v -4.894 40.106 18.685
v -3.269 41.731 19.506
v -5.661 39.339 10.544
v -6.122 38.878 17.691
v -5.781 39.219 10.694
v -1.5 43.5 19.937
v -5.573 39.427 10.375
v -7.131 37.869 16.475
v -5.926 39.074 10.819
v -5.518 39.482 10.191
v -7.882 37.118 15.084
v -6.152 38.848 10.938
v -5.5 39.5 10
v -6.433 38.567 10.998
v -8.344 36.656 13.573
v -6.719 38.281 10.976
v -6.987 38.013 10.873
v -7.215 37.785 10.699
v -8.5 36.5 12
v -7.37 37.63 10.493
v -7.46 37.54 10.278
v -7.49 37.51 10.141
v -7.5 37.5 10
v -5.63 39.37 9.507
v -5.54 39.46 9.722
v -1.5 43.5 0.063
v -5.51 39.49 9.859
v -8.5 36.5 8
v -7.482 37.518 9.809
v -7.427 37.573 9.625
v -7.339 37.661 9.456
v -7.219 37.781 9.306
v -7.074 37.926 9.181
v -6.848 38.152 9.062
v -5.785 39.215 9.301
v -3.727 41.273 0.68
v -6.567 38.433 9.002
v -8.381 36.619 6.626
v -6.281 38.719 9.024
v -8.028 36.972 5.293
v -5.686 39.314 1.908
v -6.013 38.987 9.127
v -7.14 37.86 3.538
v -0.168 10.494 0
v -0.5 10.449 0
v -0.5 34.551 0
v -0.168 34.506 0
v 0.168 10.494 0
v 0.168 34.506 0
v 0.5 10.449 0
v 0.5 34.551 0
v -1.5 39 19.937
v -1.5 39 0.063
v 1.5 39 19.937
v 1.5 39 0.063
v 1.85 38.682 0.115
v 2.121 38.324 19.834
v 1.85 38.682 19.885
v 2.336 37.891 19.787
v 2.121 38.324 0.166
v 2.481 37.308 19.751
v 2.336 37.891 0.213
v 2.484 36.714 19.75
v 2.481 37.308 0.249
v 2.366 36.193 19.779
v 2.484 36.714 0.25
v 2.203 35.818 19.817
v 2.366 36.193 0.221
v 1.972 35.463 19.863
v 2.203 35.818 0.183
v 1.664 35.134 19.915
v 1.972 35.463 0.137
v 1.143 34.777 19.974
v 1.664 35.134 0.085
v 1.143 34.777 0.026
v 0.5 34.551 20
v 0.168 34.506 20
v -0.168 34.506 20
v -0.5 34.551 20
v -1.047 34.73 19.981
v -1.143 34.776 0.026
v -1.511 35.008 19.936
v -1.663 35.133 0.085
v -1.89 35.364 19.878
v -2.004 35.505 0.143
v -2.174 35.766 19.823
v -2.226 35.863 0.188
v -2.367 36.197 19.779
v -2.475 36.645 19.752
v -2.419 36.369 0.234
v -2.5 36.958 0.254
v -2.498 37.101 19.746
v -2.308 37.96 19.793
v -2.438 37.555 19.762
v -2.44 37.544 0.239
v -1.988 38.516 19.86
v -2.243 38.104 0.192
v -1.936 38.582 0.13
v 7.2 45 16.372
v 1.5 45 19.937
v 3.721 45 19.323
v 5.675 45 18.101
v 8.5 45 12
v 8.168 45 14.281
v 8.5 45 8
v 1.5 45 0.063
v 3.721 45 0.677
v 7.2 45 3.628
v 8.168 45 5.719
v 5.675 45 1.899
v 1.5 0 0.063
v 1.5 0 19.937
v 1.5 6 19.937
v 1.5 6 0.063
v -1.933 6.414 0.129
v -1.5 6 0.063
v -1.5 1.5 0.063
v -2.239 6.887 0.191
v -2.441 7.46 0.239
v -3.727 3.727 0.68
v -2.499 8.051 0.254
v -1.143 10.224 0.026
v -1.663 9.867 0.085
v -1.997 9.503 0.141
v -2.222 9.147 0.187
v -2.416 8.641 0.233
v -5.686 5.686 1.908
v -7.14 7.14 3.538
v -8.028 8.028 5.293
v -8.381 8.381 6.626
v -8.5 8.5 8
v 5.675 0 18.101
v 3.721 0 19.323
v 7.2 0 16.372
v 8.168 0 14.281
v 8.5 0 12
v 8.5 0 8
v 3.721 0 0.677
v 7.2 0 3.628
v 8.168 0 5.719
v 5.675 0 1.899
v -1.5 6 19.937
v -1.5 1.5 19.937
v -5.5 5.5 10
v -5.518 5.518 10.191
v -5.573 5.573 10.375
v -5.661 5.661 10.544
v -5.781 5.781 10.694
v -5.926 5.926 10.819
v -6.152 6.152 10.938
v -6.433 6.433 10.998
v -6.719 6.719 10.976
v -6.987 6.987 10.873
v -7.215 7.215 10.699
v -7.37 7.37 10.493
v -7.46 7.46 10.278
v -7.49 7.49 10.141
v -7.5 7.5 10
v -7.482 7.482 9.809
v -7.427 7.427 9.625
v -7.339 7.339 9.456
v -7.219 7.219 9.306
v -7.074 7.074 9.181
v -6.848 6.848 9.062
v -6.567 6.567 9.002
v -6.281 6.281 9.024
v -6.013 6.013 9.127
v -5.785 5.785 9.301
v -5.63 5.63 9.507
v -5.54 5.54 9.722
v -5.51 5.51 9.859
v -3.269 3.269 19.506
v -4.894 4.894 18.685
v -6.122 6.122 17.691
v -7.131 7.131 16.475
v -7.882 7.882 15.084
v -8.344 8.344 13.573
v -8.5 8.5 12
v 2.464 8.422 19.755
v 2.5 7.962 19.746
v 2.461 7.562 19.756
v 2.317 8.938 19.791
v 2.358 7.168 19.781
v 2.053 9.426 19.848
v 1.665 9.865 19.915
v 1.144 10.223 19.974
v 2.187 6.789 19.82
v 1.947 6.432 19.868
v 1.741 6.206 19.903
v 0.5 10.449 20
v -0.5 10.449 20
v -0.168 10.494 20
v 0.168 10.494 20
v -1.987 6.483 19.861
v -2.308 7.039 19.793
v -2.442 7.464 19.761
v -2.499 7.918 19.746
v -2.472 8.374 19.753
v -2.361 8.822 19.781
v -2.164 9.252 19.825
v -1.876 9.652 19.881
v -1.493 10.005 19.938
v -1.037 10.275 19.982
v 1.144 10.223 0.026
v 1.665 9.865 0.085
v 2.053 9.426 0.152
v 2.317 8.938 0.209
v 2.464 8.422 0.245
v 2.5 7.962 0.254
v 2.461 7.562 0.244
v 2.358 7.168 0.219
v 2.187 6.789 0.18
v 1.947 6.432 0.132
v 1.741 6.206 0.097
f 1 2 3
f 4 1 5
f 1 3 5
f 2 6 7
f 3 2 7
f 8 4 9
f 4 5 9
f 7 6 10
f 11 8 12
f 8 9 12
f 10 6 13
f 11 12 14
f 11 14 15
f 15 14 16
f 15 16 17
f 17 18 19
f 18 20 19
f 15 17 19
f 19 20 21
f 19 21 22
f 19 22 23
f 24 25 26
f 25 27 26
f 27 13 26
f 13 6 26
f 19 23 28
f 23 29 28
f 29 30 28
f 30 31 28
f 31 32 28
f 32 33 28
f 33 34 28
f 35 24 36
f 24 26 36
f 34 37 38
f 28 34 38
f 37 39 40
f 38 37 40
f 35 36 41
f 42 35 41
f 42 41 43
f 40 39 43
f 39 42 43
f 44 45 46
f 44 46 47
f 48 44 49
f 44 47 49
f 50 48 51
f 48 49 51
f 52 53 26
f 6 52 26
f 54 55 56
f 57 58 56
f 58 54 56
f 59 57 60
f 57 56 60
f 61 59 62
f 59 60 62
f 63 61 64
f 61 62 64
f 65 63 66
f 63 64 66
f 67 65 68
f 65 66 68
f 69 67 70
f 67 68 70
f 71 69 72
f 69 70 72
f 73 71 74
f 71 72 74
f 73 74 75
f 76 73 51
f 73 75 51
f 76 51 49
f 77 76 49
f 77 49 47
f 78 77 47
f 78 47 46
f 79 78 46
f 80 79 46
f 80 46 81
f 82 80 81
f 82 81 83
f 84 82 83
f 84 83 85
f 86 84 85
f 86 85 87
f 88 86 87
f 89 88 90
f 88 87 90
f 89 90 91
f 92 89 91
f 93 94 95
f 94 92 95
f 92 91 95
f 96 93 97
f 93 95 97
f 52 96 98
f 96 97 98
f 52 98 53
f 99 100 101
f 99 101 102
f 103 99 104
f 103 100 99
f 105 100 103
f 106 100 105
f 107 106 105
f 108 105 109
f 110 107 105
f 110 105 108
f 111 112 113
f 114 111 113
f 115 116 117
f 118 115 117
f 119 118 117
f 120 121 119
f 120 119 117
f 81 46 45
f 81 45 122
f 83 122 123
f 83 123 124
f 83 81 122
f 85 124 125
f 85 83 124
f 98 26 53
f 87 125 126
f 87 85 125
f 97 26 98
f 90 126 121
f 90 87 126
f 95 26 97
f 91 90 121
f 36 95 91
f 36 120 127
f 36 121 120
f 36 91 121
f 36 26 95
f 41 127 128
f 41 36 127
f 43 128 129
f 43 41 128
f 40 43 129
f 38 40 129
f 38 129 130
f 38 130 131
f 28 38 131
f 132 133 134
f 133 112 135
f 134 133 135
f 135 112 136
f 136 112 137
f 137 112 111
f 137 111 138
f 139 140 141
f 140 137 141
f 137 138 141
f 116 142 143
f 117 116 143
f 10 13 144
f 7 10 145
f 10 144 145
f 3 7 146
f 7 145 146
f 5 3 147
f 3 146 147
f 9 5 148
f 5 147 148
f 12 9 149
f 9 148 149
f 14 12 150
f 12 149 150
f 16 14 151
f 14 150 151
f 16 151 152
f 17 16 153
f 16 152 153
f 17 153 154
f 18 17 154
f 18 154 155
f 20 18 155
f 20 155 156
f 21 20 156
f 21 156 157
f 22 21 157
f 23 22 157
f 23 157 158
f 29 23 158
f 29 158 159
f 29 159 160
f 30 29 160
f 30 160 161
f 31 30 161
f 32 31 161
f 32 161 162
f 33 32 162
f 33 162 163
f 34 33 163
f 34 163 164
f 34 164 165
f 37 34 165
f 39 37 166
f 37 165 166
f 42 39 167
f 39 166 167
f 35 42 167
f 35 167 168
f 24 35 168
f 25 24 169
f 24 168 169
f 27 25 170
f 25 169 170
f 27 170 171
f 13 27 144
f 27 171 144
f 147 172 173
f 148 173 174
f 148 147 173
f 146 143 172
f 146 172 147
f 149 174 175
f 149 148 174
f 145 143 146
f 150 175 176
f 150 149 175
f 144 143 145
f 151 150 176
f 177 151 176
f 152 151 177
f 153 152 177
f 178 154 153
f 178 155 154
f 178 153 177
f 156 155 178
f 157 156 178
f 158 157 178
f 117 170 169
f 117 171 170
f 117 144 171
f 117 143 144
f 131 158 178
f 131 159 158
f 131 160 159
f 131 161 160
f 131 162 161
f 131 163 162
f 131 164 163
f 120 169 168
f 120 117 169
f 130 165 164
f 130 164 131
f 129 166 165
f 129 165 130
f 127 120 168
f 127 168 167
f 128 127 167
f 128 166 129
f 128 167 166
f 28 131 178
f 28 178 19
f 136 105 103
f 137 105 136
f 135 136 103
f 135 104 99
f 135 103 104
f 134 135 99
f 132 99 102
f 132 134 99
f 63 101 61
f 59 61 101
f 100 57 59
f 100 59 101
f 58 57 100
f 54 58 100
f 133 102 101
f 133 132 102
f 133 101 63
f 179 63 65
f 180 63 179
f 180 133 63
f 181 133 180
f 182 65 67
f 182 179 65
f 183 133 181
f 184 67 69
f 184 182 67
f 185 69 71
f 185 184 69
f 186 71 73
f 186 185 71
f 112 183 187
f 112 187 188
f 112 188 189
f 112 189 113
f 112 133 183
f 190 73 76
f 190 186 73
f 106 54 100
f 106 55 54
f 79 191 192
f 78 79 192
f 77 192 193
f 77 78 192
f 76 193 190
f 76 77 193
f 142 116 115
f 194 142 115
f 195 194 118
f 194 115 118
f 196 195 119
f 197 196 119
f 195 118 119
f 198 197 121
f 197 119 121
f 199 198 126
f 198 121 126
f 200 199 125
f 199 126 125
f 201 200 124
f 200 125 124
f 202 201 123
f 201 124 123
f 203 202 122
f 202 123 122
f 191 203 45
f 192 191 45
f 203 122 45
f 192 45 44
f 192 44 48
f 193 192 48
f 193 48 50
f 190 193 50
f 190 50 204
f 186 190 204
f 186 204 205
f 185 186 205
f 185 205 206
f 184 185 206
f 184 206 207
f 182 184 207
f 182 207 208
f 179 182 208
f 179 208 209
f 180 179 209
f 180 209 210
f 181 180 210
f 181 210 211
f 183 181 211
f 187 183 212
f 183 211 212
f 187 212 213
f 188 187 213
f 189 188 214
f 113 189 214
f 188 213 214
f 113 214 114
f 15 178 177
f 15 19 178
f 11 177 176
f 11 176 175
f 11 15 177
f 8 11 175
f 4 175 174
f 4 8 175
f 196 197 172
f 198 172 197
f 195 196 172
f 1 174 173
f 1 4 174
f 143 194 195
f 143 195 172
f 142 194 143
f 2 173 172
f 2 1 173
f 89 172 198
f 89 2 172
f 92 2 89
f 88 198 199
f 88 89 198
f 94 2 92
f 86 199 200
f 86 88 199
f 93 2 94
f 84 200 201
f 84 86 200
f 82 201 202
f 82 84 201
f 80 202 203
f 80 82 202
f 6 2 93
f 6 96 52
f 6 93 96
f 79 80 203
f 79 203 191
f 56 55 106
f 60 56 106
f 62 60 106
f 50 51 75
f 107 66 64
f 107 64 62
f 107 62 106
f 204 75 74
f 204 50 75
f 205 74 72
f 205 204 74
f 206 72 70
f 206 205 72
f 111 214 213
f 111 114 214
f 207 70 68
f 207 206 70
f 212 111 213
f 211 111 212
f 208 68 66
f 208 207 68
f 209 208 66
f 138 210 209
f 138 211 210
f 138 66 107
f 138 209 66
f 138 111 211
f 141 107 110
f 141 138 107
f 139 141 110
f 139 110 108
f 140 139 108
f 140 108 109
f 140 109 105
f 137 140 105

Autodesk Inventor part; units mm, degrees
ref_plane "YZ Plane" through (0, 0, 0) normal (1, 0, 0) x (0, 1, 0)
ref_plane "XZ Plane" through (0, 0, 0) normal (0, 1, 0) x (-1, 0, 0)
ref_plane "XY Plane" through (0, 0, 0) normal (0, 0, 1) x (1, 0, 0)
sketch "Sketch1" plane through (0, 0, 0) normal (0, 0, 1) x (1, 0, 0)
  line L0 (0, 0) -> (2.5, 0)
  line L1 (2.5, 0) -> (2.5, 45)
  line L2 (2.5, 45) -> (-2.5, 45)
  line L3 (-2.5, 45) -> (-2.5, 0)
  circle A0 centre (0, 0) radius 8.5
  line L4 (0, 45) -> (8.5, 45) construction
  circle A1 centre (0, 45) radius 8.5
  line L5 (-8.5, 0) -> (-8.5, 45)
  line L6 (8.5, 45) -> (8.5, 0)
  line L7 (0, 45) -> (8.5, 45)
  line L8 (0, 45) -> (-8.5, 36.5)
  line L9 (0, 45) -> (12.0208, 45) construction
  line L10 (0, 0) -> (8.5, 0)
  line L11 (0, 0) -> (-8.5, 8.5)
  line L12 (0, 0) -> (12.0208, 0) construction
  dimension "d9" = 17
  dimension "d1" = 2.5
  dimension "d2" = 45
  dimension "d3" = 5
  dimension "d5" = 17
  dimension "d10" = 2.5
  dimension "d11" = 0
  dimension "d12" = 135
  dimension "d13" = 135
extrude "Extrusion1" add sketch "Sketch1" along normal blind 20 contours L11 L3 A0 L1 L0 | L1 A0 L10 | L11 A0 L3 | A0 L3 A1 L1 | L1 A1 L6 A0 | A0 L11 L5 L8 A1 L3 | A1 L3 L8 L2 L1 | L1 L7 A1 | A1 L8 L3
sketch "Sketch2" plane through (0, 0, 0) normal (0, 0, -1) x (-1, 0, 0)
  line L0 (0, 0) -> (-8.5, 0) projected
  line L1 (0, 0) -> (0, 8)
  circle A0 centre (0, 8) radius 2.5
  line L2 (8.5, 8.5) -> (0, 0) projected
  line L3 (0, 0) -> (-1.5, 0)
  line L4 (-1.5, 0) -> (-1.5, 8)
  line L5 (-1.5, 8) -> (1.5, 8)
  line L6 (1.5, 8) -> (1.5, 0)
  line L7 (1.5, 0) -> (0, 0)
  line L8 (0, 45) -> (8.5, 36.5) projected
  line L9 (0, 45) -> (0, 37)
  line L10 (0, 37) -> (-1.5, 37)
  line L11 (-1.5, 37) -> (-1.5, 45)
  line L12 (-8.5, 45) -> (0, 45) projected
  line L13 (0, 37) -> (1.5, 37)
  line L14 (1.5, 37) -> (1.5, 45)
  line L15 (1.5, 45) -> (0, 45)
  circle A1 centre (0, 37) radius 2.5
  point P0 (-1.5, 39)
  point P1 (1.5, 39)
  point P2 (-1.5, 6)
  point P3 (1.5, 6)
  dimension "d16" = 8
  dimension "d17" = 5
  dimension "d18" = 1.5
  dimension "d19" = 3
  dimension "d20" = 8
  dimension "d21" = 1.5
  dimension "d22" = 1.5
  dimension "d23" = 5
extrude "Extrusion2" cut sketch "Sketch2" against normal through all
fillet "Fillet1" radius 8 4 edges at (8.5, 22.5, 0) (8.5, 22.5, 20) (-8.5, 22.5, 0) (-8.5, 22.5, 20)
sketch "Sketch4" plane through (1.5, 0, 0.0627) normal (0, -1, 0) x (1, 0, 0)
  line L0 (-10, 7.9373) -> (-10, 11.9373) projected
  line L1 (-10, 9.9373) -> (-8, 9.9373)
  circle A0 centre (-8, 9.9373) radius 1
  point P0 (-1.5, -0.0627)
  dimension "d31" = 2
  dimension "d32" = 2
extrude "Extrusion4" cut sketch "Sketch4" against normal through all
properties part number "index_f1"
